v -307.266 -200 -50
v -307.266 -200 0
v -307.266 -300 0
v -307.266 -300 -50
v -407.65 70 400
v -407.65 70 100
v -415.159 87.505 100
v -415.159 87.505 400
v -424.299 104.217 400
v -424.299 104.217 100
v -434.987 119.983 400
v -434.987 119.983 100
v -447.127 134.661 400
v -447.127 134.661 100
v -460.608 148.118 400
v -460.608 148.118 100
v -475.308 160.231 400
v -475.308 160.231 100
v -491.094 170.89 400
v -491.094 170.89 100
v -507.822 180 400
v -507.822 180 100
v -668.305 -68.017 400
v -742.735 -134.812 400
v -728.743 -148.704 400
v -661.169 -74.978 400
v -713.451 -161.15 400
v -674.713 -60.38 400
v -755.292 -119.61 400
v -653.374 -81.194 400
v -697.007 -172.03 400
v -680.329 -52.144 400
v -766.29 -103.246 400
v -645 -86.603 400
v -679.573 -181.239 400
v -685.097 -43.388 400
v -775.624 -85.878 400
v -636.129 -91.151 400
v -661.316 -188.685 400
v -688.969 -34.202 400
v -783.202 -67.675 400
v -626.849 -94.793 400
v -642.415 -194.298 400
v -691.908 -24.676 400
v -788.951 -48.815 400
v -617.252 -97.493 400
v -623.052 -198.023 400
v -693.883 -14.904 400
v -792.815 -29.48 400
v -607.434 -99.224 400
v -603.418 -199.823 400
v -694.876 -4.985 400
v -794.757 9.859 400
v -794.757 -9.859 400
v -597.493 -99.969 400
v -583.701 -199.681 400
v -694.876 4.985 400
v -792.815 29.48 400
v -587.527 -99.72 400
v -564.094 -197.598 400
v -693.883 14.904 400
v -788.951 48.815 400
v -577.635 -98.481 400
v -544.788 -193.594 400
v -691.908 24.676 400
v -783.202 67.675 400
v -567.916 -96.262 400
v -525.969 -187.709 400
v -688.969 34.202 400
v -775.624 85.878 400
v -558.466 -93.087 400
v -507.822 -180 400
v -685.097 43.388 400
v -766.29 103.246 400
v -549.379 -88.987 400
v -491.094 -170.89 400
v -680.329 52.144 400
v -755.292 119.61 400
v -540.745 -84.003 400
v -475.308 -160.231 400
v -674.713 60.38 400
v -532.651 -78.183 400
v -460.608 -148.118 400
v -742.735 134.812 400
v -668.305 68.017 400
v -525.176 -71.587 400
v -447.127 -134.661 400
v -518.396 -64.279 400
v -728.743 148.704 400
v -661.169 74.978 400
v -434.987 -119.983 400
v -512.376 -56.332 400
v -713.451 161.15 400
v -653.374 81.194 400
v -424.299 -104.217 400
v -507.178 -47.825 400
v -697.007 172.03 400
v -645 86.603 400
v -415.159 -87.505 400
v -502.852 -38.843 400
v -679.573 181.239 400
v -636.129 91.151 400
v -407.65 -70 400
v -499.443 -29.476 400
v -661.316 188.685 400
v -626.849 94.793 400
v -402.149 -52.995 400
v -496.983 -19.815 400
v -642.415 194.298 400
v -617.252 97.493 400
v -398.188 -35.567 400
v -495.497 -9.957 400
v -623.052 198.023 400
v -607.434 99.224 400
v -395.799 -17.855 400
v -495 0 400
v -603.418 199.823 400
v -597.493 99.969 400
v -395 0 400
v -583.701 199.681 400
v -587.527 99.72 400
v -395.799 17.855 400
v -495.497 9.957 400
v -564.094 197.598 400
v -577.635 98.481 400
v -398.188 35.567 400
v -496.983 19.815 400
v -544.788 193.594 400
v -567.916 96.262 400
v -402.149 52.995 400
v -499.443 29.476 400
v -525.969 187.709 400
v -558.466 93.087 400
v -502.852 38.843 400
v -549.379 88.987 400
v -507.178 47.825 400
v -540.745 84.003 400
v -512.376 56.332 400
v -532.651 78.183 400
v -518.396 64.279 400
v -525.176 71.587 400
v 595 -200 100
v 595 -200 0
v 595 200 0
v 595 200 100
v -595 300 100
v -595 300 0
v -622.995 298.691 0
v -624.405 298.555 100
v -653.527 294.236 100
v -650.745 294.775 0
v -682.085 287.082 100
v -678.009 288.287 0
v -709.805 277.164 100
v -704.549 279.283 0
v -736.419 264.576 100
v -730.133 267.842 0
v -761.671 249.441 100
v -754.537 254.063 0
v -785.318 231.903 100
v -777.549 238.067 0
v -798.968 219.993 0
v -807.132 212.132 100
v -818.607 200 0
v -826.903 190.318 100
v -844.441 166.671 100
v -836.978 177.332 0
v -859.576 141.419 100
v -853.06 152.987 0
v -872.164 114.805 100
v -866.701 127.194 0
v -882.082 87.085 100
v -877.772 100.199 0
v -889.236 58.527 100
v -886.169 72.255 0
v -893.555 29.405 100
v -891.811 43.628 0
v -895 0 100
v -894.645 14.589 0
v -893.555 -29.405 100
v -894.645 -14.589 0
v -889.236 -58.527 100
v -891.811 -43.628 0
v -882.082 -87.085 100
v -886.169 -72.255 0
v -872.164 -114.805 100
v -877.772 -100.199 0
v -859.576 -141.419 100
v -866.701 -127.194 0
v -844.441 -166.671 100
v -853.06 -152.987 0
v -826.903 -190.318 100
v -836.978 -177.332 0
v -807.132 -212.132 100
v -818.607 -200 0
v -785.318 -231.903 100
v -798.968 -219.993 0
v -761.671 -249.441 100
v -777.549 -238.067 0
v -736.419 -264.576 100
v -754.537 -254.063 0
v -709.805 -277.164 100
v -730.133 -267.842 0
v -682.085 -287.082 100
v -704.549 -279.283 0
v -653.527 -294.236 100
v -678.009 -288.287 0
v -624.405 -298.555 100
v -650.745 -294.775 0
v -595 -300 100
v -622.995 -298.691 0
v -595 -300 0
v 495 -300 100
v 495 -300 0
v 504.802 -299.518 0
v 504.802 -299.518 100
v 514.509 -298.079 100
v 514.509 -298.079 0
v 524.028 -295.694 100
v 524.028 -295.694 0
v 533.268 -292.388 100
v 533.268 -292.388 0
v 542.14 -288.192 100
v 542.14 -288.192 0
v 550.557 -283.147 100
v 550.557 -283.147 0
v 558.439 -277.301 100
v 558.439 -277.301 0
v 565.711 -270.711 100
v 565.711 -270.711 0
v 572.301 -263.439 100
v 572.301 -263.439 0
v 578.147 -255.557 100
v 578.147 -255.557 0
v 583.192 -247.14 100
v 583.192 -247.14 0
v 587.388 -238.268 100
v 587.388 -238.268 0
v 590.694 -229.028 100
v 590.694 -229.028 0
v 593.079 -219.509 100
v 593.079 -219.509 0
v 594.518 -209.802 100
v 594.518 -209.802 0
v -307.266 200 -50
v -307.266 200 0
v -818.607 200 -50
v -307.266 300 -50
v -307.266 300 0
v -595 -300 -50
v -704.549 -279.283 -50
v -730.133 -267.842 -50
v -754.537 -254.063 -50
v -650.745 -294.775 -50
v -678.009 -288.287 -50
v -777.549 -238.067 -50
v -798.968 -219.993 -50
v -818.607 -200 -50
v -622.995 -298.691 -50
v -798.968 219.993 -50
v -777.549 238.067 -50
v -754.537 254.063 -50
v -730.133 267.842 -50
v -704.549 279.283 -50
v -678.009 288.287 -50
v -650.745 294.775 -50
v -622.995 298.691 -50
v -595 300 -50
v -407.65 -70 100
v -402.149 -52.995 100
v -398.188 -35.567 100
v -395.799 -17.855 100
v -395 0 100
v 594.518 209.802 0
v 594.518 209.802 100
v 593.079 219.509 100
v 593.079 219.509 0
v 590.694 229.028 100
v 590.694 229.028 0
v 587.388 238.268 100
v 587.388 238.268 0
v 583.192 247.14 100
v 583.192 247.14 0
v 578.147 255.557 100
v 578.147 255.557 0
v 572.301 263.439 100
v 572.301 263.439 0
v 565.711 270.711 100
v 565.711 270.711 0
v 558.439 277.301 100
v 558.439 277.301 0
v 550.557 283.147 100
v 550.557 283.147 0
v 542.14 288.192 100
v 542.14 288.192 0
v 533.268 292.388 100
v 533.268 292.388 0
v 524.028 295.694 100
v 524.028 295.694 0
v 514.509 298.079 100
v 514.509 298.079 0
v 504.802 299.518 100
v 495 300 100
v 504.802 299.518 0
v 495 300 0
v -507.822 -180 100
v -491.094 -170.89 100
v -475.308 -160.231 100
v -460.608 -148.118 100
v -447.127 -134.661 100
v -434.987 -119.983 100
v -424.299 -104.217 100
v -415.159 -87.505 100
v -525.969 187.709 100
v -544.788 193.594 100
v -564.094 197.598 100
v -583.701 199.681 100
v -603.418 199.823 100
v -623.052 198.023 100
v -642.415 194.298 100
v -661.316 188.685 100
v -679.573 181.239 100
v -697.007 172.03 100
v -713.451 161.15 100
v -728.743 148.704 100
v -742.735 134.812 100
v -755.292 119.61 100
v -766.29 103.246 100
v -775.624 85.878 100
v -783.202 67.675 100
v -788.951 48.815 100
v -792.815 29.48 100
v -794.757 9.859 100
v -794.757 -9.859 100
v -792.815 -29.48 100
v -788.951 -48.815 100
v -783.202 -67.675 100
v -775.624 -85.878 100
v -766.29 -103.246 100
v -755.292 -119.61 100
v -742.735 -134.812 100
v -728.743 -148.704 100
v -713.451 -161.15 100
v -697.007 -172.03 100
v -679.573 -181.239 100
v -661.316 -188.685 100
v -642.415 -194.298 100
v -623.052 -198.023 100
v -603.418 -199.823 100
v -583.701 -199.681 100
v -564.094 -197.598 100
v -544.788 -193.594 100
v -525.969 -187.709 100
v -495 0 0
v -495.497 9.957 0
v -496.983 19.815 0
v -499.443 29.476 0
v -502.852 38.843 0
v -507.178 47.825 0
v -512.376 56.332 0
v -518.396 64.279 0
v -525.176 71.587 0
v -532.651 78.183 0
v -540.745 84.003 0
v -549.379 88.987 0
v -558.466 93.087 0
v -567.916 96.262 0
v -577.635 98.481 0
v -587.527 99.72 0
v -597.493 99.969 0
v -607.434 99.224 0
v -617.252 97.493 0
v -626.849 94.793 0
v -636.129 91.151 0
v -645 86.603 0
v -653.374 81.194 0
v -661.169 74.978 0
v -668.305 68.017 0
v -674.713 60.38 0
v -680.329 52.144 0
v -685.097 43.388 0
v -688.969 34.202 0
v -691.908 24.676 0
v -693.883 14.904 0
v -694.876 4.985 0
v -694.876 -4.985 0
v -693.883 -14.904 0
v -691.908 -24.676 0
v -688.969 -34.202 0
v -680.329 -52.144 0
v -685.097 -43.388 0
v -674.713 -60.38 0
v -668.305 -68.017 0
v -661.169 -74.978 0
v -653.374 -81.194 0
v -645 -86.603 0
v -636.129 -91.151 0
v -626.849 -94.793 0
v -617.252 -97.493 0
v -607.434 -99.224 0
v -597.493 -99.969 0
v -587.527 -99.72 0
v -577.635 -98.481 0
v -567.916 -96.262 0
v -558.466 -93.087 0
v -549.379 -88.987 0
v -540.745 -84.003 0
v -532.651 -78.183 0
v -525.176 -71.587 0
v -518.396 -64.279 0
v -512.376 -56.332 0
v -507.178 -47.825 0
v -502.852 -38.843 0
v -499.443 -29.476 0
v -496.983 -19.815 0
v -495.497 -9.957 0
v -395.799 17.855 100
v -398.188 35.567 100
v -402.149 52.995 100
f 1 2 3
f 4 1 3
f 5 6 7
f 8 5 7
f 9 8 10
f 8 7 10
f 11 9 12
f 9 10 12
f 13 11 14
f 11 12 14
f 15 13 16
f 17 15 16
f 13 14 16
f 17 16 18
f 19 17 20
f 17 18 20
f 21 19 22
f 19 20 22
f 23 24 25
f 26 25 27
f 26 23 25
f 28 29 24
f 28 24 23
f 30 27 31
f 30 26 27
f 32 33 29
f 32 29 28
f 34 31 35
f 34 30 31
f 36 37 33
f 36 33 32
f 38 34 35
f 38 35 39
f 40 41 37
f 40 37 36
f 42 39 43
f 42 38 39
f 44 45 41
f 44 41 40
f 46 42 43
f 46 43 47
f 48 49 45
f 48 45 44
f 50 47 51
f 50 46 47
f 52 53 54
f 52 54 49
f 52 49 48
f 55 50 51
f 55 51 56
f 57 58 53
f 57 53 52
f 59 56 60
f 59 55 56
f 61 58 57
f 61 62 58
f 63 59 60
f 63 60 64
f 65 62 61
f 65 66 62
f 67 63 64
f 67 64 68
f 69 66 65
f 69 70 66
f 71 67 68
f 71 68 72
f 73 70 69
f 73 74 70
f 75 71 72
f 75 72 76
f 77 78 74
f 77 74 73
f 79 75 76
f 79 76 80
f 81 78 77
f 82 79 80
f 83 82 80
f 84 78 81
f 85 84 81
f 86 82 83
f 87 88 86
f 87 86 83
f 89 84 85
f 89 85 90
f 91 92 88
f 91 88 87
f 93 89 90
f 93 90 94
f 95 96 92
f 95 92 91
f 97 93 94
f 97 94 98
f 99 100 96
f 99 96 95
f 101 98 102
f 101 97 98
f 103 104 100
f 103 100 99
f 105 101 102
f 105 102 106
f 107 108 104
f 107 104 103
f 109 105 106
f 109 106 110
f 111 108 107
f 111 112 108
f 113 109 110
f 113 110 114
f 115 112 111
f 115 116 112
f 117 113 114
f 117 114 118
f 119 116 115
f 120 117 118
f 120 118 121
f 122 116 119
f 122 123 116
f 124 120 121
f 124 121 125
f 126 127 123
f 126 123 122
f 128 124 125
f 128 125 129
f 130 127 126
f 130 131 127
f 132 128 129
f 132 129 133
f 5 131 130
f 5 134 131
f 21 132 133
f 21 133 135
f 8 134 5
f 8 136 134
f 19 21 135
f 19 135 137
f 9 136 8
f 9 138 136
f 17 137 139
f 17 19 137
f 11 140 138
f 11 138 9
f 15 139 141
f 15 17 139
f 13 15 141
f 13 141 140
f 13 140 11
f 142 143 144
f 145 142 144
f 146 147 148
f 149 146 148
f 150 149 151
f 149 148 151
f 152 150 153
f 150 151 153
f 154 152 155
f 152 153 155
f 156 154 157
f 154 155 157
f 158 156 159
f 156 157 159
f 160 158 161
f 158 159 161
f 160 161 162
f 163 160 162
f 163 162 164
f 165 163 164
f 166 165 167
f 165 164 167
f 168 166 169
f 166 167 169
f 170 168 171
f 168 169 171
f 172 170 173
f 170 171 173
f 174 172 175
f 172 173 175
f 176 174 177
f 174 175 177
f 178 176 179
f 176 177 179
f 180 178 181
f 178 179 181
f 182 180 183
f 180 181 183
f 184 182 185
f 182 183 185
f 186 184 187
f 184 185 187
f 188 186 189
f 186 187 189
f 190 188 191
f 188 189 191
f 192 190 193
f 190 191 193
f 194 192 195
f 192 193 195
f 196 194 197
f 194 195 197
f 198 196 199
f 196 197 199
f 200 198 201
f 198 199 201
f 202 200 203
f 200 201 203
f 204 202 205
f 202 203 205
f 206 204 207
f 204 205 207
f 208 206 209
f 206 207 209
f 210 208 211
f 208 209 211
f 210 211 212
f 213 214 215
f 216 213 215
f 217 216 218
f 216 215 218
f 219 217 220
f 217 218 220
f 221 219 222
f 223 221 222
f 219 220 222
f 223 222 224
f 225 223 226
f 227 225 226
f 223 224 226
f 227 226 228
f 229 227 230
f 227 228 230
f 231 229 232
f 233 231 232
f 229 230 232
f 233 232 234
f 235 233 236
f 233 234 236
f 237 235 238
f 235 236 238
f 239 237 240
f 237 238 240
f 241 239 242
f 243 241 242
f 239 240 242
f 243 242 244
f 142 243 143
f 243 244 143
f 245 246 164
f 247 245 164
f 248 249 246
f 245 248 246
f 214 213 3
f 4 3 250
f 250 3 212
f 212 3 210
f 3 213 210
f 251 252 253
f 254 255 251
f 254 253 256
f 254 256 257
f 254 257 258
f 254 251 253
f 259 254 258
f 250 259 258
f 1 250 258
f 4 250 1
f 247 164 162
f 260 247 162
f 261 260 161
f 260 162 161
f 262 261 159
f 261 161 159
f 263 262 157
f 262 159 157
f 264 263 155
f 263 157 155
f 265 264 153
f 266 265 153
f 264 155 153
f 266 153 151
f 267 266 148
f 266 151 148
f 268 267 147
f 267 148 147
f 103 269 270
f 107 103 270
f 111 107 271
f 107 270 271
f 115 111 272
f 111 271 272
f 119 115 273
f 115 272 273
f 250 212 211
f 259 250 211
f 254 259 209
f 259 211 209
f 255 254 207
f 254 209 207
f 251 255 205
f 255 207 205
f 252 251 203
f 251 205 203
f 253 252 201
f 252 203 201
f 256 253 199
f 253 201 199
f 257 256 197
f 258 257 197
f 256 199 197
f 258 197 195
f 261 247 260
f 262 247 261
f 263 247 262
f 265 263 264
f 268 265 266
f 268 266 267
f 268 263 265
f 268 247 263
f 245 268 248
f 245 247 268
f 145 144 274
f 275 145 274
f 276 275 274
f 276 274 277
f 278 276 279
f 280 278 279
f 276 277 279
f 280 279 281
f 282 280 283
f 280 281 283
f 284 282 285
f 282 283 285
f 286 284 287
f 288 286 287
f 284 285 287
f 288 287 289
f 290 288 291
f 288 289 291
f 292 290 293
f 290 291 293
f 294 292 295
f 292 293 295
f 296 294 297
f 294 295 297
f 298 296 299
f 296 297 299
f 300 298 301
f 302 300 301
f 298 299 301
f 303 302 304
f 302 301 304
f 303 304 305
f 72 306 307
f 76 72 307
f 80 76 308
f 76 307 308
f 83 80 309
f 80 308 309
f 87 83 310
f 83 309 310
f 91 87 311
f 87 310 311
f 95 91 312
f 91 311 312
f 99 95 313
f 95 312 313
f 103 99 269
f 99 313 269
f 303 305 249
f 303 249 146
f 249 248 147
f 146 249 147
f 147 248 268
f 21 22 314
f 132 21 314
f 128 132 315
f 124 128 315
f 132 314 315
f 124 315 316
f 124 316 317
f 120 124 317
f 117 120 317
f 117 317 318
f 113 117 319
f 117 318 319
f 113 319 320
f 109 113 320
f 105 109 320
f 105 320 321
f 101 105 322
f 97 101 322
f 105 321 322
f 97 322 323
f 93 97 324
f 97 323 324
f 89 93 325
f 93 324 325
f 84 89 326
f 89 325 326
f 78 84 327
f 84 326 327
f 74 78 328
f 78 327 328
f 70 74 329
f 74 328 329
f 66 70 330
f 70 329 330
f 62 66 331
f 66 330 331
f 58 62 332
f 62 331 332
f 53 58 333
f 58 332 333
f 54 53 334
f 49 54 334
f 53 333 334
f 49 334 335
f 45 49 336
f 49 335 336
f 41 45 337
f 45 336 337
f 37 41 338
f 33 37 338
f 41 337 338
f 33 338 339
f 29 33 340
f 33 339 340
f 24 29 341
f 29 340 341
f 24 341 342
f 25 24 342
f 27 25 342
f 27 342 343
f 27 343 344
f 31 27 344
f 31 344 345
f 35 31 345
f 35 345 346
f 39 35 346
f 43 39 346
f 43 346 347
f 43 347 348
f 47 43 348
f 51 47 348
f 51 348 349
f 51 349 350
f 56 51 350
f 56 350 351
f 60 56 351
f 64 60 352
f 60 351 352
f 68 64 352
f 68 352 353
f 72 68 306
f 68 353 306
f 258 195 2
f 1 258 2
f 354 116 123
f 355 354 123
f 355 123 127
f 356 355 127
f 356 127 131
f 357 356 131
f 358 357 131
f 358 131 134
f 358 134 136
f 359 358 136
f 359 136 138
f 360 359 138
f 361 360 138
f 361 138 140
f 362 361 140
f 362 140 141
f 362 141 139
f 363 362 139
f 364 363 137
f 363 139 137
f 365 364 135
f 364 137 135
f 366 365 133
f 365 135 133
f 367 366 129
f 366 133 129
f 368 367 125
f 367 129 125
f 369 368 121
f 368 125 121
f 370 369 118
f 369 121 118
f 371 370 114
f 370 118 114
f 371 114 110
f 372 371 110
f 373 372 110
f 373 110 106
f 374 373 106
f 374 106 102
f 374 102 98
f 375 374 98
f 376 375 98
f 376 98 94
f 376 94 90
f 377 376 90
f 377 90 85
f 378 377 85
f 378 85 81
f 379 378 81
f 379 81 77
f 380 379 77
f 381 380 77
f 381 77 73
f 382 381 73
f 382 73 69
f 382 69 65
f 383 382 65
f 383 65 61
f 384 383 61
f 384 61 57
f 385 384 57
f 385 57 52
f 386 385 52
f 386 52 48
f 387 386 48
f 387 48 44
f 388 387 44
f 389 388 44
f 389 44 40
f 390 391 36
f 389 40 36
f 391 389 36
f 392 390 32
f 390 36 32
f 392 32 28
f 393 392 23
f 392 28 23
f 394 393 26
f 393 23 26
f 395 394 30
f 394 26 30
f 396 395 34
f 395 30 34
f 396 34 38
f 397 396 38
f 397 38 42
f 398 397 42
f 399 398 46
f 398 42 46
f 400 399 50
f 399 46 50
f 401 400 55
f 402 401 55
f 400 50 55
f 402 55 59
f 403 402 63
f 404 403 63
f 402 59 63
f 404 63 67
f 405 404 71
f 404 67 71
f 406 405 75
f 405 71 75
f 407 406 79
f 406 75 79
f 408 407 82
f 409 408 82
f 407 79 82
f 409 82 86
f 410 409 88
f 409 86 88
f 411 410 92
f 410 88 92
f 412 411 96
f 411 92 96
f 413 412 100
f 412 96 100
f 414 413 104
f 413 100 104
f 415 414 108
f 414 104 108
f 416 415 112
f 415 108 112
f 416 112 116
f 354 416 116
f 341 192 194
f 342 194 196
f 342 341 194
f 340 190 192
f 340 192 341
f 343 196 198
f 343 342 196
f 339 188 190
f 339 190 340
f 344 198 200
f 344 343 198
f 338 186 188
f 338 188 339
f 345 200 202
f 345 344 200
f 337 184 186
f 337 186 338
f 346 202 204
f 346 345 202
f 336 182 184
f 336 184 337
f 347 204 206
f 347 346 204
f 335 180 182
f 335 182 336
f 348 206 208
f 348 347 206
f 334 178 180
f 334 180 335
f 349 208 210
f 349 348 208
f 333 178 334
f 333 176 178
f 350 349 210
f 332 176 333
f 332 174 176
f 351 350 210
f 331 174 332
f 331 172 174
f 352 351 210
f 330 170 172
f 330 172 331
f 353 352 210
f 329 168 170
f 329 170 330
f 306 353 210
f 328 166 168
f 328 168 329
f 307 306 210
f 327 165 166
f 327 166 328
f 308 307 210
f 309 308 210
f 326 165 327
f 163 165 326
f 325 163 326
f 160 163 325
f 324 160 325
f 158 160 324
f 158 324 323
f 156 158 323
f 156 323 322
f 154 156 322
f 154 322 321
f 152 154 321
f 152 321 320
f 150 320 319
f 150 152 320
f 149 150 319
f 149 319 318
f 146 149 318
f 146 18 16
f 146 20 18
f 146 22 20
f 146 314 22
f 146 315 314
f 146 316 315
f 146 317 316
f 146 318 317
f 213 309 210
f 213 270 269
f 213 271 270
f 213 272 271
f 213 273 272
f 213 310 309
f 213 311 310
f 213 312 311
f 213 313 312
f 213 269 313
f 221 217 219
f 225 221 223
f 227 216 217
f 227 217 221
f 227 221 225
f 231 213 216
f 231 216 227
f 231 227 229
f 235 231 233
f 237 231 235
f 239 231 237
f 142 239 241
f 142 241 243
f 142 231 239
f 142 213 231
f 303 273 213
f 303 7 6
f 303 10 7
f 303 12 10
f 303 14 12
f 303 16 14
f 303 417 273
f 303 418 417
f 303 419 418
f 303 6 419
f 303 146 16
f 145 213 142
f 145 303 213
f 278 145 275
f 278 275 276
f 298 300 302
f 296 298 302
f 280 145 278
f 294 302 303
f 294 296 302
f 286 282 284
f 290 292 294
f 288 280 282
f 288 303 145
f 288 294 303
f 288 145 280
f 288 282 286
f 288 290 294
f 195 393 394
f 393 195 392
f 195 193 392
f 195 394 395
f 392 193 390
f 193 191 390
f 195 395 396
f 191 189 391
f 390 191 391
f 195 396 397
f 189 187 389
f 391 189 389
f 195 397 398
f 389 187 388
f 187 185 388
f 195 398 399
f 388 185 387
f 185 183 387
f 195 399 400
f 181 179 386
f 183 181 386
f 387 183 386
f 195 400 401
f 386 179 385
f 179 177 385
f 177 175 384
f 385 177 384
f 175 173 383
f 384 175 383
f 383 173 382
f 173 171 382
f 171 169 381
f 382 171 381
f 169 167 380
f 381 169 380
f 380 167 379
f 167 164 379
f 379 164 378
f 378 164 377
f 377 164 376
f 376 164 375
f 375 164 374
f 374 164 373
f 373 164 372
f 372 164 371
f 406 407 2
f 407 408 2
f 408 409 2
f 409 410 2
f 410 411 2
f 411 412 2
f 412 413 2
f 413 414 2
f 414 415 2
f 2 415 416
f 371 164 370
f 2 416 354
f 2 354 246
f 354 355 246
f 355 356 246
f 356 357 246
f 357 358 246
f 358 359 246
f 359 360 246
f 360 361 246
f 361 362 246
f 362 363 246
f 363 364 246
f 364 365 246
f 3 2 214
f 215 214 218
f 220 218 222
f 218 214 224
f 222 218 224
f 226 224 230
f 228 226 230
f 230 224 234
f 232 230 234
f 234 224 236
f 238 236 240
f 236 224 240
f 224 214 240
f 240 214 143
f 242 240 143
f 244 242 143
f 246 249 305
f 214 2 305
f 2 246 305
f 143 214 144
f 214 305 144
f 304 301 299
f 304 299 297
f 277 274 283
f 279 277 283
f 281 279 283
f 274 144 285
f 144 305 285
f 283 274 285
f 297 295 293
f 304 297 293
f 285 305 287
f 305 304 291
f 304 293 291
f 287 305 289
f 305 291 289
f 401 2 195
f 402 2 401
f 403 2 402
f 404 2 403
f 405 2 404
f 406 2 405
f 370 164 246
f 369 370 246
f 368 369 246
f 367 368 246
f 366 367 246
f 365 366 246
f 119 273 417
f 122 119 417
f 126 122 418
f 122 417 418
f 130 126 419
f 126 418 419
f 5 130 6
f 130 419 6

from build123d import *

# Parameters (mm, degrees)
F1_DEPTH = 100
F3_DEPTH = 50
F5_DEPTH = 300
F6_R     = 100
F7_DEPTH = 450.001


with BuildPart() as f1:
    # F0 (on Top) → F1 (new body)
    with BuildSketch(Plane.XY):
        with BuildLine():
            ThreePointArc((-595, 300), (-895, 0), (-595, -300))
            Line((-595, -300), (495, -300))
            ThreePointArc((495, -300), (565.710678, -270.710678), (595, -200))
            Line((595, -200), (595, 200))
            ThreePointArc((595, 200), (565.710678, 270.710678), (495, 300))
            Line((495, 300), (-595, 300))
        make_face()
    extrude(amount=F1_DEPTH)

    # F2 (on face) → F3 (join)
    with BuildSketch(Plane(origin=(0, 0, 0), x_dir=(1, 0, 0), z_dir=(0, 0, -1))):
        with BuildLine():
            ThreePointArc((-595, 300), (-717.474487, 273.861279), (-818.606798, 200))
            Line((-818.606798, 200), (-307.265759, 200))
            Line((-307.265759, 200), (-307.265759, 300))
            Line((-307.265759, 300), (-595, 300))
        make_face()
        with BuildLine():
            Line((-307.265759, -200), (-818.606798, -200))
            ThreePointArc((-818.606798, -200), (-717.474487, -273.861279), (-595, -300))
            Line((-595, -300), (-307.265759, -300))
            Line((-307.265759, -300), (-307.265759, -200))
        make_face()
    extrude(amount=F3_DEPTH)

    # F4 (on face) → F5 (join)
    with BuildSketch(Plane.XY.offset(100)):
        with BuildLine():
            ThreePointArc((-407.65006, -70), (-398.187922, -35.566923), (-395, 0))
            ThreePointArc((-395, 0), (-398.187922, 35.566923), (-407.65006, 70))
            ThreePointArc((-407.65006, 70), (-447.1271, 134.661076), (-507.822021, 180))
            ThreePointArc((-507.822021, 180), (-795, 0), (-507.822021, -180))
            ThreePointArc((-507.822021, -180), (-447.1271, -134.661076), (-407.65006, -70))
        make_face()
    extrude(amount=F5_DEPTH)

    # F6 (on face) → F7 (cut, through all)
    with BuildSketch(Plane.XY.offset(400)):
        with Locations((-595, 0)):
            Circle(F6_R)
    extrude(amount=-F7_DEPTH, mode=Mode.SUBTRACT)


solid = f1.part
